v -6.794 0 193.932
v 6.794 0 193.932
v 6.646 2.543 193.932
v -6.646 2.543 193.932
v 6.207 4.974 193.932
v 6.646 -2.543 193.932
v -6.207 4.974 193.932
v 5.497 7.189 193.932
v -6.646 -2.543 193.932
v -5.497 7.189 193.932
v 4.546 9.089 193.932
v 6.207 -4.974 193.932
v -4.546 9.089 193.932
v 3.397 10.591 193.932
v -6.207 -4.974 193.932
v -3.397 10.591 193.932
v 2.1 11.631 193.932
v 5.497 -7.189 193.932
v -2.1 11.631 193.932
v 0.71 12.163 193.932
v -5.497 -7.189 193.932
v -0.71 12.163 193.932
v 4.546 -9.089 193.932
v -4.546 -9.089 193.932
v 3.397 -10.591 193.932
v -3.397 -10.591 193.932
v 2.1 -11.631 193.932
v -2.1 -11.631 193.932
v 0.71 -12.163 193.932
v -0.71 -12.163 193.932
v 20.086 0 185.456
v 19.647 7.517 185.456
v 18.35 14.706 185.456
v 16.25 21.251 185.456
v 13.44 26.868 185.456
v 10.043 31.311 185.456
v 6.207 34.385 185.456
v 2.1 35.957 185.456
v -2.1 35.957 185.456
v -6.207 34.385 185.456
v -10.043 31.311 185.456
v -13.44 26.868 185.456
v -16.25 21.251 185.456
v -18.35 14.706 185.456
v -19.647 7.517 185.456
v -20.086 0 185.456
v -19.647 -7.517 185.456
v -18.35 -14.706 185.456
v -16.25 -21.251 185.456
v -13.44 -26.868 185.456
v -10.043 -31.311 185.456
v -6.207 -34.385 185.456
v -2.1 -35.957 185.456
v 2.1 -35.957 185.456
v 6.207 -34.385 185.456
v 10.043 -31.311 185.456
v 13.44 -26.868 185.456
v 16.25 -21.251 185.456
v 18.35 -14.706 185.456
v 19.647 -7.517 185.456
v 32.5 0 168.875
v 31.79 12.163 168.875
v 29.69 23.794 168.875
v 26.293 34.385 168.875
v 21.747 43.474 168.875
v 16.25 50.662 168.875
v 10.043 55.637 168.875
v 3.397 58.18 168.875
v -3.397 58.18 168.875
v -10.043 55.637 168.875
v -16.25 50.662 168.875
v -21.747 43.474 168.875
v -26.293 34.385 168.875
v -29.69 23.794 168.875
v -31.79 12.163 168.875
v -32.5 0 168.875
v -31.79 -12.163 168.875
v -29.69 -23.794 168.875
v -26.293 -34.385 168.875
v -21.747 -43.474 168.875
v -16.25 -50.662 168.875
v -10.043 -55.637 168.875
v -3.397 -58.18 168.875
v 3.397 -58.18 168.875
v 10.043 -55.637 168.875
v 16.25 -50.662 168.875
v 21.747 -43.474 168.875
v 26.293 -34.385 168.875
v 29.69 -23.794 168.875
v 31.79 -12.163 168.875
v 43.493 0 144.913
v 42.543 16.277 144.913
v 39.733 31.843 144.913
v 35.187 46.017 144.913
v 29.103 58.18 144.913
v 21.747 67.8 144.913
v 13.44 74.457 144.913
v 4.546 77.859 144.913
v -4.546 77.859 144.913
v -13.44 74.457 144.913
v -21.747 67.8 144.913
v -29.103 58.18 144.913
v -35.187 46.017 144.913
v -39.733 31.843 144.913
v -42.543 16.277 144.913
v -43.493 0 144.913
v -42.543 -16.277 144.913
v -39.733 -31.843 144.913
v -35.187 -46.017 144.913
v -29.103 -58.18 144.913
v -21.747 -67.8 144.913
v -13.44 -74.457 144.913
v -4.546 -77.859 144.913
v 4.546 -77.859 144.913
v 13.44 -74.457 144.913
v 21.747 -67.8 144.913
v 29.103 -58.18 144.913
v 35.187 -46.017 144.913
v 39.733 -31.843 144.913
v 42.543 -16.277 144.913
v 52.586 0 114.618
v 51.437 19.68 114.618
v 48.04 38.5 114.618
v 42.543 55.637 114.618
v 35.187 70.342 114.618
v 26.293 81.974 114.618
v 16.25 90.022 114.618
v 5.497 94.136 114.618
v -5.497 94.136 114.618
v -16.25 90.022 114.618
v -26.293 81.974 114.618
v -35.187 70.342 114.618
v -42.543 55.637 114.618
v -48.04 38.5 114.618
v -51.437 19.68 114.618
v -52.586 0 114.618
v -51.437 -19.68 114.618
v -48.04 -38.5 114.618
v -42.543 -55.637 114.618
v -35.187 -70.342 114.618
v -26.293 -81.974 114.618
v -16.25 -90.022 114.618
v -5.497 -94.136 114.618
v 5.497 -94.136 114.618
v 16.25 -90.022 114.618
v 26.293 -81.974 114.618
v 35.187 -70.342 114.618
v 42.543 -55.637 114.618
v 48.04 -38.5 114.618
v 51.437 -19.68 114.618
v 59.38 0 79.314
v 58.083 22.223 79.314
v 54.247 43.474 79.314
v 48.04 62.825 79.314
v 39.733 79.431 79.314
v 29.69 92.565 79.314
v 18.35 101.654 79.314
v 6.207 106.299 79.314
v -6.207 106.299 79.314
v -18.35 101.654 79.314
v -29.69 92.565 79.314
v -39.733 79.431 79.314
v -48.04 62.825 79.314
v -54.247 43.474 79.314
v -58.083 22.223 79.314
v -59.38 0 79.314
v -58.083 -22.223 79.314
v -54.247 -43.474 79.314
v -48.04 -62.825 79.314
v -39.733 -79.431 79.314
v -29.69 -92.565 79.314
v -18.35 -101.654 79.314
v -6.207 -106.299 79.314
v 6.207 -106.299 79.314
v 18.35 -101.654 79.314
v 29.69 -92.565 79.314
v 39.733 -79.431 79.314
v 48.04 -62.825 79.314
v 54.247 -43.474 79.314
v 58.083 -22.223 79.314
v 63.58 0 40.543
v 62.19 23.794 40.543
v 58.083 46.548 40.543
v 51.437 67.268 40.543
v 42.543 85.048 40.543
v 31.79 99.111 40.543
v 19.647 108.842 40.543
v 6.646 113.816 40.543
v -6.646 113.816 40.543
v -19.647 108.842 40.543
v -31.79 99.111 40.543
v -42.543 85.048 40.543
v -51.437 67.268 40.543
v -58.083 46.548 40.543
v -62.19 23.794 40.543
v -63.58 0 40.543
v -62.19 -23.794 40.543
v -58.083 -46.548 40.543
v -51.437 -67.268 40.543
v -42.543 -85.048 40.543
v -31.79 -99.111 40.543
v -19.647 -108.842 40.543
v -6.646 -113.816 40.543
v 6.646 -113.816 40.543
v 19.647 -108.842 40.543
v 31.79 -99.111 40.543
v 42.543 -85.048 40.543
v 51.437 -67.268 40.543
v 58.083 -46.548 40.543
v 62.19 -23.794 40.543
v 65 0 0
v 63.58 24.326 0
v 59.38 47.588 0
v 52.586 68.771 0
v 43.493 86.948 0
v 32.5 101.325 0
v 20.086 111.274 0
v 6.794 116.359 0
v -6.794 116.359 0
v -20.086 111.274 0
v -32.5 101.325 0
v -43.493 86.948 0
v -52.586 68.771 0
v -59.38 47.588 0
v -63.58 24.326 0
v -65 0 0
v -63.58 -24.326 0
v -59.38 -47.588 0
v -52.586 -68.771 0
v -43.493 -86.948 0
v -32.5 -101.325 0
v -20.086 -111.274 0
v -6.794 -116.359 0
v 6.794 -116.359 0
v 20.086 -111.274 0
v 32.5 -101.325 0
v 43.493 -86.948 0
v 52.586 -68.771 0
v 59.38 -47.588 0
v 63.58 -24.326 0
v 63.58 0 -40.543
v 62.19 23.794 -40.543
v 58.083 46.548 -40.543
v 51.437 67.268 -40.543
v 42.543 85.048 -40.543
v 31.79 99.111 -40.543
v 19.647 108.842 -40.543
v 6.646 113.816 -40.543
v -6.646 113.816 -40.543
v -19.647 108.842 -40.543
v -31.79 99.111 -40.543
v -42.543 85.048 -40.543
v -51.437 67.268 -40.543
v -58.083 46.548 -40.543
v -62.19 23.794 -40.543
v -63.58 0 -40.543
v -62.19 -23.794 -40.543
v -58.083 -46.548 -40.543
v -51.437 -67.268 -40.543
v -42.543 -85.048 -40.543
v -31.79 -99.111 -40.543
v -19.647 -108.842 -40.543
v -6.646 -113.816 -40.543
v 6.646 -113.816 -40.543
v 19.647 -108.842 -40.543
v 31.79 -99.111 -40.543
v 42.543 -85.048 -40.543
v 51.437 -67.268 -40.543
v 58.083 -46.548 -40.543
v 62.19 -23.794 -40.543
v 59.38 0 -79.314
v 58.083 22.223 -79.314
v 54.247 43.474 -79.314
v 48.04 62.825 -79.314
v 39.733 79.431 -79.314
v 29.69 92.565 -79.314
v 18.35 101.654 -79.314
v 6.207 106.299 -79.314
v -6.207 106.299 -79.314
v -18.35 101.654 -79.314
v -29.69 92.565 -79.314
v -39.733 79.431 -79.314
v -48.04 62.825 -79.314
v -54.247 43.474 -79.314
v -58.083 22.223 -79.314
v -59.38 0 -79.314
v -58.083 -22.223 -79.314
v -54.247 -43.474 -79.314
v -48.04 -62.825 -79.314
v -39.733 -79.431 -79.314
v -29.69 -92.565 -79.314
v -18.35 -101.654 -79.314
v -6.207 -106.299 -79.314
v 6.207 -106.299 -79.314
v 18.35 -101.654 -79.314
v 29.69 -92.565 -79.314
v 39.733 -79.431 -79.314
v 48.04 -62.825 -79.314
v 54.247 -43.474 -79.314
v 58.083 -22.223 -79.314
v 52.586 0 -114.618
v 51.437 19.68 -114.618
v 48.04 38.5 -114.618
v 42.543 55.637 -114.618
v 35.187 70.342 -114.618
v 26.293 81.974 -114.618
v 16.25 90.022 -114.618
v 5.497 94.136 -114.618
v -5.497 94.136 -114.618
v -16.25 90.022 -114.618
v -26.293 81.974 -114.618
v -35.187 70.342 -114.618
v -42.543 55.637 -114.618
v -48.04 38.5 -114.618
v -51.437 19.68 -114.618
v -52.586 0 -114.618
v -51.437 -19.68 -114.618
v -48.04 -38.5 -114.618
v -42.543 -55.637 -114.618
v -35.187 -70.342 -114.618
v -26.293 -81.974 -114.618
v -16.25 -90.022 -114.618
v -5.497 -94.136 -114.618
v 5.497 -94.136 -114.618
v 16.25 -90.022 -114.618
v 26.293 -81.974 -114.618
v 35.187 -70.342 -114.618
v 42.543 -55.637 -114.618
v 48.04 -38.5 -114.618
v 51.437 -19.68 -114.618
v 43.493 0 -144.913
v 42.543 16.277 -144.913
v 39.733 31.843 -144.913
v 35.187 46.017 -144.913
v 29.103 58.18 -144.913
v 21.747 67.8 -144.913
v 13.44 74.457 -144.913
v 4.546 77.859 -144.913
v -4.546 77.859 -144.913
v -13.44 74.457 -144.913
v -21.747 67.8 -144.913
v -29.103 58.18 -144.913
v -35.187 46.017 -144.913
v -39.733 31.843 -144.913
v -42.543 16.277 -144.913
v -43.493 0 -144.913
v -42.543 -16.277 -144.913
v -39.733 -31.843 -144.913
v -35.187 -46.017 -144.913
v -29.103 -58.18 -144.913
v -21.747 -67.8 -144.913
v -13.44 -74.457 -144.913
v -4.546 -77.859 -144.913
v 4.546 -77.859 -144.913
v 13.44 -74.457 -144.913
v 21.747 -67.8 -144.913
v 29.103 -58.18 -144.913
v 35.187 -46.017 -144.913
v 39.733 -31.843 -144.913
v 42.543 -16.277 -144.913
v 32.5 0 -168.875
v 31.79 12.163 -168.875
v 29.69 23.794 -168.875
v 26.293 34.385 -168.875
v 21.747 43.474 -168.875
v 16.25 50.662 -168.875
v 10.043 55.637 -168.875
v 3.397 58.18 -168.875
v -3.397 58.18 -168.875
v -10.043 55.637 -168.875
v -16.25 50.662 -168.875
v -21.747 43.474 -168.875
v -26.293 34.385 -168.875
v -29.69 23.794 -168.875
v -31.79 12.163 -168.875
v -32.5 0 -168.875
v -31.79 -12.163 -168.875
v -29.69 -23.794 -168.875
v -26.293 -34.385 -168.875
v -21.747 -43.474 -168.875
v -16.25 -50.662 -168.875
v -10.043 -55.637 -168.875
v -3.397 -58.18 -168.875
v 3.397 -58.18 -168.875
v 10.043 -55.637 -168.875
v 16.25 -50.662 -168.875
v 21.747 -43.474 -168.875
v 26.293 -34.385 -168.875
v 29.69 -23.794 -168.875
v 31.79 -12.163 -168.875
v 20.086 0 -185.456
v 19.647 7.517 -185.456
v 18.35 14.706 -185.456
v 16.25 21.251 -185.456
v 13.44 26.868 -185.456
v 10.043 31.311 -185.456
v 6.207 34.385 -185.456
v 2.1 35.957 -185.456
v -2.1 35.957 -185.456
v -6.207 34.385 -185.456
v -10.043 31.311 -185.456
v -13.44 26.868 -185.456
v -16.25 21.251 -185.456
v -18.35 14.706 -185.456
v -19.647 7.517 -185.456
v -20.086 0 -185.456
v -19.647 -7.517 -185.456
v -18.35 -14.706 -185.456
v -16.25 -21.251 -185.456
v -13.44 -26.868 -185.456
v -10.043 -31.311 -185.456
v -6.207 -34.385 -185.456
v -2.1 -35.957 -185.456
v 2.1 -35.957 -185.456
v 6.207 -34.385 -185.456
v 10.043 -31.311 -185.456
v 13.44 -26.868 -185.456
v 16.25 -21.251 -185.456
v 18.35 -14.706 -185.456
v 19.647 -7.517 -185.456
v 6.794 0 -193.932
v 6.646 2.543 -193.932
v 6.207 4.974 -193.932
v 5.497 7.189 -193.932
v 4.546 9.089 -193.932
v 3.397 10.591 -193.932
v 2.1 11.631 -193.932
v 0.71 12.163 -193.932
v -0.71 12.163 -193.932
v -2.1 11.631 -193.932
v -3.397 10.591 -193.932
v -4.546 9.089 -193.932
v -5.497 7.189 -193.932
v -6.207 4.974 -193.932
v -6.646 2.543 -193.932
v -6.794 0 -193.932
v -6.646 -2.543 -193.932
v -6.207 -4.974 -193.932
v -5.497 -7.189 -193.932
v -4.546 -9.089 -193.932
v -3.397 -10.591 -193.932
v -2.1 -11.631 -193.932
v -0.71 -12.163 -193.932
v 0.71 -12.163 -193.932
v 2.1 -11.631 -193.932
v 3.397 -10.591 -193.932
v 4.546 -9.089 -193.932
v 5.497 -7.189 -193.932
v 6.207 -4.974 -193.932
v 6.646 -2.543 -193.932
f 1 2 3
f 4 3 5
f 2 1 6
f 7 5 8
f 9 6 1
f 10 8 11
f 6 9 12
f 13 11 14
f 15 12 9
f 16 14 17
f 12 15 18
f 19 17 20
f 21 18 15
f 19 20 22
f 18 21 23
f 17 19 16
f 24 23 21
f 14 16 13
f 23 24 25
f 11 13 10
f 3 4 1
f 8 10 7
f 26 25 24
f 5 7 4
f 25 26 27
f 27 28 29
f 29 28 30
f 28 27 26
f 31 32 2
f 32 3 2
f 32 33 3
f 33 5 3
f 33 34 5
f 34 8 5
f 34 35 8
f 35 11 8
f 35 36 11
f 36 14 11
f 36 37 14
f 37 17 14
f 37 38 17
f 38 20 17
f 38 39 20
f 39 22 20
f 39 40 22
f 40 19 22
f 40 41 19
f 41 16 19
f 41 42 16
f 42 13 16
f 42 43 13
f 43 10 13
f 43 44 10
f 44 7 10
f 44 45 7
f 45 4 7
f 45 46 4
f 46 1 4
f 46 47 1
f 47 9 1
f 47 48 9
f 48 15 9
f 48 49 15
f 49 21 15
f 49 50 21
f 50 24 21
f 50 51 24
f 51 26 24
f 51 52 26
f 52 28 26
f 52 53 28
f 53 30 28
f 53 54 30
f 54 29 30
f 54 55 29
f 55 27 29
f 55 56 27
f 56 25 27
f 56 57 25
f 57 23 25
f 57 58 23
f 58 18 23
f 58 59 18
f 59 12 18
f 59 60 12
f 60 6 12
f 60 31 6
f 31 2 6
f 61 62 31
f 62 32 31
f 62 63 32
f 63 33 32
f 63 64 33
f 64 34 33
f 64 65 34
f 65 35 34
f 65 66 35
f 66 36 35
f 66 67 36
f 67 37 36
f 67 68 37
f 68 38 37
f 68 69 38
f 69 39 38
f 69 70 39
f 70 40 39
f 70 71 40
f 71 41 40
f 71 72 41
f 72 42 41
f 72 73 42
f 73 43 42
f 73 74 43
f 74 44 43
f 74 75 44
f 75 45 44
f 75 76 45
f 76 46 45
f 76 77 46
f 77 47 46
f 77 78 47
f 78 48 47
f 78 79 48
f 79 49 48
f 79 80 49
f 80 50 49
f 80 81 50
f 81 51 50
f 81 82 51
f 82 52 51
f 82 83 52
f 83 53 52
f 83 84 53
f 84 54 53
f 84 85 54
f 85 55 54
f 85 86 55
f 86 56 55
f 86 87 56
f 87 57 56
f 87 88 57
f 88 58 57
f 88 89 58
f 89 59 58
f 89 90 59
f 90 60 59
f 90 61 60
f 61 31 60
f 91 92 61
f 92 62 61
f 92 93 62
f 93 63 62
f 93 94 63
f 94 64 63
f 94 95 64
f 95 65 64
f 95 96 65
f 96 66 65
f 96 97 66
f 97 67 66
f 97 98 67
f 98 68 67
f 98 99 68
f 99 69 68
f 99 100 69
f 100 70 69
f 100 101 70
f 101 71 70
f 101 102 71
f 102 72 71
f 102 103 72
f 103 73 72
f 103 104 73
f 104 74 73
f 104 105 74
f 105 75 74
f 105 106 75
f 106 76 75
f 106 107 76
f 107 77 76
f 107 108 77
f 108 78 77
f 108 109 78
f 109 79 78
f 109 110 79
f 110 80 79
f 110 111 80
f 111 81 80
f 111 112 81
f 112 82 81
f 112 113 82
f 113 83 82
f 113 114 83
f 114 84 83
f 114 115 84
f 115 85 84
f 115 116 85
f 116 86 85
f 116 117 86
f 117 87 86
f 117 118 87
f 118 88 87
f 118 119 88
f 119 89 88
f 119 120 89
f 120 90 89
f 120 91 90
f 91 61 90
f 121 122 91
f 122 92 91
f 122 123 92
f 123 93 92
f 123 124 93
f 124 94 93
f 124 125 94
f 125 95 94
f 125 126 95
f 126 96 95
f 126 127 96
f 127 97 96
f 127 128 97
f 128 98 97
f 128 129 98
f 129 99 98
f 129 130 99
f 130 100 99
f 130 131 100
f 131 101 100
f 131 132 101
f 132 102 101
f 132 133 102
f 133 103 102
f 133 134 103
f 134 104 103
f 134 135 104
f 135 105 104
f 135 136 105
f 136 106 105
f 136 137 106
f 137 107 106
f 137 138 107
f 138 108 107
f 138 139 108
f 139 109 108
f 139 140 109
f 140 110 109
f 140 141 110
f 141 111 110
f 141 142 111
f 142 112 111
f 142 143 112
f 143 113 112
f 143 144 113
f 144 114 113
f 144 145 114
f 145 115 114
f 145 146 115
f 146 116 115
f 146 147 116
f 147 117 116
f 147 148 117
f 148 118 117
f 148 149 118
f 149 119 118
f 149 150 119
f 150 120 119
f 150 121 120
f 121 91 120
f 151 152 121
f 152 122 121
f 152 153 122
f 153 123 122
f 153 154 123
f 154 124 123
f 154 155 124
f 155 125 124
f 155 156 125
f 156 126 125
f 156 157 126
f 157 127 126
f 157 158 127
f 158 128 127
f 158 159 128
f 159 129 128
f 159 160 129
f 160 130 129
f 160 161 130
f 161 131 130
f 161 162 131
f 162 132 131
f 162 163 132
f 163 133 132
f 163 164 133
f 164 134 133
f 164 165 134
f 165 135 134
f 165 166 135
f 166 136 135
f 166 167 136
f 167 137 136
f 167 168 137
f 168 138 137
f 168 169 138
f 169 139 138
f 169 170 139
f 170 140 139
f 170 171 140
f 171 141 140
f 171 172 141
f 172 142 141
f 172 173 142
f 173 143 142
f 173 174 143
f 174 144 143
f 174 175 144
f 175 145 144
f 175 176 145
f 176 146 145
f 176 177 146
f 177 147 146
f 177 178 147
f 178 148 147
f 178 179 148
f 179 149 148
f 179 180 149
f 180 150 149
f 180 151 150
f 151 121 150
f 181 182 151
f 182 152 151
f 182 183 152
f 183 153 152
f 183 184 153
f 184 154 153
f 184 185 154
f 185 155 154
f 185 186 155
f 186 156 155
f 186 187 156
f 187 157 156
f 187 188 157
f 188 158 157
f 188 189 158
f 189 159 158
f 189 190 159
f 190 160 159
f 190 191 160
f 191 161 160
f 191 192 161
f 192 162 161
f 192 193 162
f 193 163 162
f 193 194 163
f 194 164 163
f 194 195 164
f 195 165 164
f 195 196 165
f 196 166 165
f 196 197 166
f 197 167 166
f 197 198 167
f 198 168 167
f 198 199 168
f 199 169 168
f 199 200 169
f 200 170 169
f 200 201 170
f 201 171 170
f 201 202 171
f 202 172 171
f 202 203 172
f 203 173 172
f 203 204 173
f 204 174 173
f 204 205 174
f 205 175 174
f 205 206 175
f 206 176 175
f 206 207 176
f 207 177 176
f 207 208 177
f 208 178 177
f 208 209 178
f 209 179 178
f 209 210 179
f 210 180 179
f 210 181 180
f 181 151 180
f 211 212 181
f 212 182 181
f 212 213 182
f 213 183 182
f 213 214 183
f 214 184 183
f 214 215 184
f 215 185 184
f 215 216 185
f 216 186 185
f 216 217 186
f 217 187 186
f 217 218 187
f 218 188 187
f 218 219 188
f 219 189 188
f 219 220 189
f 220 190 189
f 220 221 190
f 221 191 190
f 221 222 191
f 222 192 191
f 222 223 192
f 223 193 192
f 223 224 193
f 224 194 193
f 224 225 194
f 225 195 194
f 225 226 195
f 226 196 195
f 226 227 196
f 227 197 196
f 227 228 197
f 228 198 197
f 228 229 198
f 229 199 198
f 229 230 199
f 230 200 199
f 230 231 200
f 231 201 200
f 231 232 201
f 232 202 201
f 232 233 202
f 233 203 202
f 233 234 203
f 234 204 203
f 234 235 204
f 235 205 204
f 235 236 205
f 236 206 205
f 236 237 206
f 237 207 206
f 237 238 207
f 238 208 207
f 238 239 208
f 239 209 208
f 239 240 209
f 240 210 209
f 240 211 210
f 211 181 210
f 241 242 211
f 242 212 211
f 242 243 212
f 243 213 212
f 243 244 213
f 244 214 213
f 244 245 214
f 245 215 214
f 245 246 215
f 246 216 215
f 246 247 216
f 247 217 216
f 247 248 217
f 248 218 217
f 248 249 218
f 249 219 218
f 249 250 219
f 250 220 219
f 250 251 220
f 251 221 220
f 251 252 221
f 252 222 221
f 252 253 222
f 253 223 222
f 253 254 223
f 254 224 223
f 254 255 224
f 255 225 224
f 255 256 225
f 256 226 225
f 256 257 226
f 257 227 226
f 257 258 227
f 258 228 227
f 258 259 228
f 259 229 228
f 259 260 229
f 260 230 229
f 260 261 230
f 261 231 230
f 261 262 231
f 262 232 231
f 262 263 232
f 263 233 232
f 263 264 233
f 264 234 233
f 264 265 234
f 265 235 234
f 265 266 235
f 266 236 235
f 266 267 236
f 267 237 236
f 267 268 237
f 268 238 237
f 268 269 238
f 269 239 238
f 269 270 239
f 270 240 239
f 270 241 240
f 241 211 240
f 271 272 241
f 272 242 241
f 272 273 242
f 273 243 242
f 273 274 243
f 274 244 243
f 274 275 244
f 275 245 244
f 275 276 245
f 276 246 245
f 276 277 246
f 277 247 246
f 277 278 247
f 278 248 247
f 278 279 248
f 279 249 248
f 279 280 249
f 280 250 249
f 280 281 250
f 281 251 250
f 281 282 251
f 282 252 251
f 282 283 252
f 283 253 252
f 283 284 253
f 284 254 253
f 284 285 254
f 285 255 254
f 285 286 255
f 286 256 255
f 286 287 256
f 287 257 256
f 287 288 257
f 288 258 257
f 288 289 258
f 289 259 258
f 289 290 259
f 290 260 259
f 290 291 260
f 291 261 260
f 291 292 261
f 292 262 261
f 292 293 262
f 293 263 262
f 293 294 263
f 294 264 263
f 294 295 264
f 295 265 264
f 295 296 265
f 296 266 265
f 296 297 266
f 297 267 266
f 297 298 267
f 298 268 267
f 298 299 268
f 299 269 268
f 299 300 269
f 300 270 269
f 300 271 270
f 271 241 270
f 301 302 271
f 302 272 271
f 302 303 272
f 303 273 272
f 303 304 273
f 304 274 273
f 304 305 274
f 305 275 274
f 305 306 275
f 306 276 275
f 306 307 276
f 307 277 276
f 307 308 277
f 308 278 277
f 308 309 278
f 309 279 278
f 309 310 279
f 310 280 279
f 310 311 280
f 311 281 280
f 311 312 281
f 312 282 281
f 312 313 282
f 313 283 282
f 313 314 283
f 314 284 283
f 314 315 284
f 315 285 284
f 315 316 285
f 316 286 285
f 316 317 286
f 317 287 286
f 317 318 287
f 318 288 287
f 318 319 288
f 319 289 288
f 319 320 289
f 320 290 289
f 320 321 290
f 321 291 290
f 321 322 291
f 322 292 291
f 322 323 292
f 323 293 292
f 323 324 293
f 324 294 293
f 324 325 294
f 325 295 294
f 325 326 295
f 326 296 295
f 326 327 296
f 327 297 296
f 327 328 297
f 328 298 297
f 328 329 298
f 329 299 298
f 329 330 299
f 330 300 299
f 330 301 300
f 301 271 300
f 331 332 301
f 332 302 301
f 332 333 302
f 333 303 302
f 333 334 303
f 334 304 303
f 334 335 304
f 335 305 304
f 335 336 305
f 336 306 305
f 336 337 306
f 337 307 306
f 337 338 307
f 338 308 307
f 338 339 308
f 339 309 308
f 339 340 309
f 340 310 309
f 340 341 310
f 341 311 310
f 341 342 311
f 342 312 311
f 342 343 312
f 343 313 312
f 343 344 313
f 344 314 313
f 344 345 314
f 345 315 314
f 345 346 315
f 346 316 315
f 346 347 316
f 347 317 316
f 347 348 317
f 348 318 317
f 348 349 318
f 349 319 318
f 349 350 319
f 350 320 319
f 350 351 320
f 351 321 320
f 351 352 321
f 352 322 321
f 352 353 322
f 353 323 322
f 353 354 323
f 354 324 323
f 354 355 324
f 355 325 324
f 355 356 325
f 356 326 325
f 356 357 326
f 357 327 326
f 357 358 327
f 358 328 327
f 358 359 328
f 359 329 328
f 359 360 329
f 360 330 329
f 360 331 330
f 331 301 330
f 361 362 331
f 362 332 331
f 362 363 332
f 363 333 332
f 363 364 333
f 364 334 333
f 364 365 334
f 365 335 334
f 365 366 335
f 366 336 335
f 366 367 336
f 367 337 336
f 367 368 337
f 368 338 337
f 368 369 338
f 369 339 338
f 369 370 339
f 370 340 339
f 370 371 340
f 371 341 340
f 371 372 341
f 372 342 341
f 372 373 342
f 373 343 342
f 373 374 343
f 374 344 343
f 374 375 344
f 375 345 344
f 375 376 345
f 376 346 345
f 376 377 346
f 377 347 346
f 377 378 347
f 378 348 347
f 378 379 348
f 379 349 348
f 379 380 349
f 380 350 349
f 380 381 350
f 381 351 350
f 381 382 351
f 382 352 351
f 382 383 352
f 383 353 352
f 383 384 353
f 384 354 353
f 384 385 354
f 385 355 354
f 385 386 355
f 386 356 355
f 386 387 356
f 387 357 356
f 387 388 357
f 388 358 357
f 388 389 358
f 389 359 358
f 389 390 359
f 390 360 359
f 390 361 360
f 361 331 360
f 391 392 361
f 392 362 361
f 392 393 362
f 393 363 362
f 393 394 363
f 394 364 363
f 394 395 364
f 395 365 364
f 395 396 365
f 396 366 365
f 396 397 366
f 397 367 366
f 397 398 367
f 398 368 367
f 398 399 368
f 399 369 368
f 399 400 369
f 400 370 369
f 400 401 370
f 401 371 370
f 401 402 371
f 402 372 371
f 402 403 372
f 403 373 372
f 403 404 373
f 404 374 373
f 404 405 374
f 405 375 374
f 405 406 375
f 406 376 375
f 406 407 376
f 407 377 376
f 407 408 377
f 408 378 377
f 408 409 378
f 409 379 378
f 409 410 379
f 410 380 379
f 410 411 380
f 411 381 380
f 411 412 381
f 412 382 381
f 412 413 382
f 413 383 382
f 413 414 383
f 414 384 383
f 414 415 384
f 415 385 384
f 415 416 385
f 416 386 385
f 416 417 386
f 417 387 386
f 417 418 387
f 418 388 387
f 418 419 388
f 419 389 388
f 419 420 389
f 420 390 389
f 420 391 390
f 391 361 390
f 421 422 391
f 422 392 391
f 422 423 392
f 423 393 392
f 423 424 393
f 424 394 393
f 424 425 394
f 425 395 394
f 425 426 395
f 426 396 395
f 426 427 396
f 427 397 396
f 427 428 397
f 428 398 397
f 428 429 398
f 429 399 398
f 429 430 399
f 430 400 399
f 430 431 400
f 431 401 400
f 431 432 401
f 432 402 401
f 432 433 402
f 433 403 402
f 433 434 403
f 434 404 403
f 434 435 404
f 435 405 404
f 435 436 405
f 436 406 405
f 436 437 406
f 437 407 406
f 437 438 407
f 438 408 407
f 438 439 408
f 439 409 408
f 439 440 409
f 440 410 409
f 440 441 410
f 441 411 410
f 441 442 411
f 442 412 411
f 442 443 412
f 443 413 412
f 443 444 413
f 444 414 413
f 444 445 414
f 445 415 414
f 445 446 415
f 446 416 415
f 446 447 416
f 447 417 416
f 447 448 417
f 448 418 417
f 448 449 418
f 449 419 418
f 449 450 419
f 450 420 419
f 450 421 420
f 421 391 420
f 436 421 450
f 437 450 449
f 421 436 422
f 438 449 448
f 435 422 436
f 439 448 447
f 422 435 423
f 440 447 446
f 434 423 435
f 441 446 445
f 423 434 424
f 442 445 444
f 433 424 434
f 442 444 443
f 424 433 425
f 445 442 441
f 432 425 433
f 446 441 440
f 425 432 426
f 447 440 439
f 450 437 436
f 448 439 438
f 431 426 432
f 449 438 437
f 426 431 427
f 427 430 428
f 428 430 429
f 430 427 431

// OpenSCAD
// Generated by SolidPython 1.0.1 on 2020-07-29 00:46:46


scale(v = [5, 9, 15]) {
	sphere(r = 13);
}
/***********************************************
*********      SolidPython code:      **********
************************************************
 
# import packages: SolidPython
from solid import *
from solid.utils import *
from itertools import chain, combinations, permutations


class Resize:

    def __init__(self, scad_file):
        self.scad_file = scad_file
        #self.scad_file = import_scad(scad_file)
        # cone/cylinder param:
        self.r1 = 0
        self.r2 = 0
        self.h = 0
        # rectangular prism param:
        self.w = 0
        self.l = 0
        # ellipse param:
        self.r = 0

    # import OpenScad code (file name corresponds to shape)


    # classify shape + parameters
    def assign(self, param1, param2, param3):
        if self.scad_file == 'cone.scad':
            self.r1 = param1
            self.r2 = param2
            self.h = param3
        elif self.scad_file == 'cylinder.scad':
            self.r1 = param1
            self.r2 = param2
            self.h = param3
        elif self.scad_file == 'rectangularPrism.scad':
            self.h = param1
            self.l = param2
            self.w = param3
        else:
            self.r = param1
            self.h = param2

    # resize parameters
    def iterate(self):
        x = range(3, 20, 2)
        i = 1
        if self.scad_file == 'cone.scad':
            tempList = list(permutations(x, 2))
            for temp in tempList:
                param1 = temp[0]
                param2 = temp[1]
                filepath = 'produced_scad_files/' + 'cone' + str(param1) + '_' + str(param2) + '_' + '.scad'
                scad_render_to_file(cylinder(h=param1, r1=param2, r2=0), filepath)

        elif self.scad_file == 'cylinder.scad':
            tempList = list(permutations(x, 3))
            for temp in tempList:
                param1 = temp[0]
                param2 = temp[1]
                filepath = 'produced_scad_files/' + 'cylinder' + str(param1) + '_' + str(param2) + '_' + '.scad'
                scad_render_to_file(cylinder(h=param1, r1=param2, r2=param2), filepath)

        elif self.scad_file == 'rectangularPrism.scad':
            tempList = list(permutations(x, 3))
            for temp in tempList:
                param1 = temp[0]
                param2 = temp[1]
                param3 = temp[2]
                filepath = 'produced_scad_files/' + 'rectangularPrism' + str(param1) + '_' + str(param2) + '_' + str(
                    param3) + '.scad'
                scad_render_to_file(cube(size=(param1, param2, param3)), filepath)

        elif self.scad_file == 'ellipse.scad':
            tempList = list(permutations(x, 4))
            for temp in tempList:
                param1 = temp[0]
                param2 = temp[1]
                param3 = temp[2]
                param4 = temp[3]
                filepath = 'produced_scad_files/' + 'ellipse' + str(param1) + '_' + str(param2) + '_' + str(param3) + '_' + str(param4) + '.scad'
                scad_render_to_file(scale([param1, param2, param3])(sphere(r=param4)), filepath)

    def render_to_scadfile(self):
        scad_render_to_file(scad, 'example.scad') 
 
************************************************/
